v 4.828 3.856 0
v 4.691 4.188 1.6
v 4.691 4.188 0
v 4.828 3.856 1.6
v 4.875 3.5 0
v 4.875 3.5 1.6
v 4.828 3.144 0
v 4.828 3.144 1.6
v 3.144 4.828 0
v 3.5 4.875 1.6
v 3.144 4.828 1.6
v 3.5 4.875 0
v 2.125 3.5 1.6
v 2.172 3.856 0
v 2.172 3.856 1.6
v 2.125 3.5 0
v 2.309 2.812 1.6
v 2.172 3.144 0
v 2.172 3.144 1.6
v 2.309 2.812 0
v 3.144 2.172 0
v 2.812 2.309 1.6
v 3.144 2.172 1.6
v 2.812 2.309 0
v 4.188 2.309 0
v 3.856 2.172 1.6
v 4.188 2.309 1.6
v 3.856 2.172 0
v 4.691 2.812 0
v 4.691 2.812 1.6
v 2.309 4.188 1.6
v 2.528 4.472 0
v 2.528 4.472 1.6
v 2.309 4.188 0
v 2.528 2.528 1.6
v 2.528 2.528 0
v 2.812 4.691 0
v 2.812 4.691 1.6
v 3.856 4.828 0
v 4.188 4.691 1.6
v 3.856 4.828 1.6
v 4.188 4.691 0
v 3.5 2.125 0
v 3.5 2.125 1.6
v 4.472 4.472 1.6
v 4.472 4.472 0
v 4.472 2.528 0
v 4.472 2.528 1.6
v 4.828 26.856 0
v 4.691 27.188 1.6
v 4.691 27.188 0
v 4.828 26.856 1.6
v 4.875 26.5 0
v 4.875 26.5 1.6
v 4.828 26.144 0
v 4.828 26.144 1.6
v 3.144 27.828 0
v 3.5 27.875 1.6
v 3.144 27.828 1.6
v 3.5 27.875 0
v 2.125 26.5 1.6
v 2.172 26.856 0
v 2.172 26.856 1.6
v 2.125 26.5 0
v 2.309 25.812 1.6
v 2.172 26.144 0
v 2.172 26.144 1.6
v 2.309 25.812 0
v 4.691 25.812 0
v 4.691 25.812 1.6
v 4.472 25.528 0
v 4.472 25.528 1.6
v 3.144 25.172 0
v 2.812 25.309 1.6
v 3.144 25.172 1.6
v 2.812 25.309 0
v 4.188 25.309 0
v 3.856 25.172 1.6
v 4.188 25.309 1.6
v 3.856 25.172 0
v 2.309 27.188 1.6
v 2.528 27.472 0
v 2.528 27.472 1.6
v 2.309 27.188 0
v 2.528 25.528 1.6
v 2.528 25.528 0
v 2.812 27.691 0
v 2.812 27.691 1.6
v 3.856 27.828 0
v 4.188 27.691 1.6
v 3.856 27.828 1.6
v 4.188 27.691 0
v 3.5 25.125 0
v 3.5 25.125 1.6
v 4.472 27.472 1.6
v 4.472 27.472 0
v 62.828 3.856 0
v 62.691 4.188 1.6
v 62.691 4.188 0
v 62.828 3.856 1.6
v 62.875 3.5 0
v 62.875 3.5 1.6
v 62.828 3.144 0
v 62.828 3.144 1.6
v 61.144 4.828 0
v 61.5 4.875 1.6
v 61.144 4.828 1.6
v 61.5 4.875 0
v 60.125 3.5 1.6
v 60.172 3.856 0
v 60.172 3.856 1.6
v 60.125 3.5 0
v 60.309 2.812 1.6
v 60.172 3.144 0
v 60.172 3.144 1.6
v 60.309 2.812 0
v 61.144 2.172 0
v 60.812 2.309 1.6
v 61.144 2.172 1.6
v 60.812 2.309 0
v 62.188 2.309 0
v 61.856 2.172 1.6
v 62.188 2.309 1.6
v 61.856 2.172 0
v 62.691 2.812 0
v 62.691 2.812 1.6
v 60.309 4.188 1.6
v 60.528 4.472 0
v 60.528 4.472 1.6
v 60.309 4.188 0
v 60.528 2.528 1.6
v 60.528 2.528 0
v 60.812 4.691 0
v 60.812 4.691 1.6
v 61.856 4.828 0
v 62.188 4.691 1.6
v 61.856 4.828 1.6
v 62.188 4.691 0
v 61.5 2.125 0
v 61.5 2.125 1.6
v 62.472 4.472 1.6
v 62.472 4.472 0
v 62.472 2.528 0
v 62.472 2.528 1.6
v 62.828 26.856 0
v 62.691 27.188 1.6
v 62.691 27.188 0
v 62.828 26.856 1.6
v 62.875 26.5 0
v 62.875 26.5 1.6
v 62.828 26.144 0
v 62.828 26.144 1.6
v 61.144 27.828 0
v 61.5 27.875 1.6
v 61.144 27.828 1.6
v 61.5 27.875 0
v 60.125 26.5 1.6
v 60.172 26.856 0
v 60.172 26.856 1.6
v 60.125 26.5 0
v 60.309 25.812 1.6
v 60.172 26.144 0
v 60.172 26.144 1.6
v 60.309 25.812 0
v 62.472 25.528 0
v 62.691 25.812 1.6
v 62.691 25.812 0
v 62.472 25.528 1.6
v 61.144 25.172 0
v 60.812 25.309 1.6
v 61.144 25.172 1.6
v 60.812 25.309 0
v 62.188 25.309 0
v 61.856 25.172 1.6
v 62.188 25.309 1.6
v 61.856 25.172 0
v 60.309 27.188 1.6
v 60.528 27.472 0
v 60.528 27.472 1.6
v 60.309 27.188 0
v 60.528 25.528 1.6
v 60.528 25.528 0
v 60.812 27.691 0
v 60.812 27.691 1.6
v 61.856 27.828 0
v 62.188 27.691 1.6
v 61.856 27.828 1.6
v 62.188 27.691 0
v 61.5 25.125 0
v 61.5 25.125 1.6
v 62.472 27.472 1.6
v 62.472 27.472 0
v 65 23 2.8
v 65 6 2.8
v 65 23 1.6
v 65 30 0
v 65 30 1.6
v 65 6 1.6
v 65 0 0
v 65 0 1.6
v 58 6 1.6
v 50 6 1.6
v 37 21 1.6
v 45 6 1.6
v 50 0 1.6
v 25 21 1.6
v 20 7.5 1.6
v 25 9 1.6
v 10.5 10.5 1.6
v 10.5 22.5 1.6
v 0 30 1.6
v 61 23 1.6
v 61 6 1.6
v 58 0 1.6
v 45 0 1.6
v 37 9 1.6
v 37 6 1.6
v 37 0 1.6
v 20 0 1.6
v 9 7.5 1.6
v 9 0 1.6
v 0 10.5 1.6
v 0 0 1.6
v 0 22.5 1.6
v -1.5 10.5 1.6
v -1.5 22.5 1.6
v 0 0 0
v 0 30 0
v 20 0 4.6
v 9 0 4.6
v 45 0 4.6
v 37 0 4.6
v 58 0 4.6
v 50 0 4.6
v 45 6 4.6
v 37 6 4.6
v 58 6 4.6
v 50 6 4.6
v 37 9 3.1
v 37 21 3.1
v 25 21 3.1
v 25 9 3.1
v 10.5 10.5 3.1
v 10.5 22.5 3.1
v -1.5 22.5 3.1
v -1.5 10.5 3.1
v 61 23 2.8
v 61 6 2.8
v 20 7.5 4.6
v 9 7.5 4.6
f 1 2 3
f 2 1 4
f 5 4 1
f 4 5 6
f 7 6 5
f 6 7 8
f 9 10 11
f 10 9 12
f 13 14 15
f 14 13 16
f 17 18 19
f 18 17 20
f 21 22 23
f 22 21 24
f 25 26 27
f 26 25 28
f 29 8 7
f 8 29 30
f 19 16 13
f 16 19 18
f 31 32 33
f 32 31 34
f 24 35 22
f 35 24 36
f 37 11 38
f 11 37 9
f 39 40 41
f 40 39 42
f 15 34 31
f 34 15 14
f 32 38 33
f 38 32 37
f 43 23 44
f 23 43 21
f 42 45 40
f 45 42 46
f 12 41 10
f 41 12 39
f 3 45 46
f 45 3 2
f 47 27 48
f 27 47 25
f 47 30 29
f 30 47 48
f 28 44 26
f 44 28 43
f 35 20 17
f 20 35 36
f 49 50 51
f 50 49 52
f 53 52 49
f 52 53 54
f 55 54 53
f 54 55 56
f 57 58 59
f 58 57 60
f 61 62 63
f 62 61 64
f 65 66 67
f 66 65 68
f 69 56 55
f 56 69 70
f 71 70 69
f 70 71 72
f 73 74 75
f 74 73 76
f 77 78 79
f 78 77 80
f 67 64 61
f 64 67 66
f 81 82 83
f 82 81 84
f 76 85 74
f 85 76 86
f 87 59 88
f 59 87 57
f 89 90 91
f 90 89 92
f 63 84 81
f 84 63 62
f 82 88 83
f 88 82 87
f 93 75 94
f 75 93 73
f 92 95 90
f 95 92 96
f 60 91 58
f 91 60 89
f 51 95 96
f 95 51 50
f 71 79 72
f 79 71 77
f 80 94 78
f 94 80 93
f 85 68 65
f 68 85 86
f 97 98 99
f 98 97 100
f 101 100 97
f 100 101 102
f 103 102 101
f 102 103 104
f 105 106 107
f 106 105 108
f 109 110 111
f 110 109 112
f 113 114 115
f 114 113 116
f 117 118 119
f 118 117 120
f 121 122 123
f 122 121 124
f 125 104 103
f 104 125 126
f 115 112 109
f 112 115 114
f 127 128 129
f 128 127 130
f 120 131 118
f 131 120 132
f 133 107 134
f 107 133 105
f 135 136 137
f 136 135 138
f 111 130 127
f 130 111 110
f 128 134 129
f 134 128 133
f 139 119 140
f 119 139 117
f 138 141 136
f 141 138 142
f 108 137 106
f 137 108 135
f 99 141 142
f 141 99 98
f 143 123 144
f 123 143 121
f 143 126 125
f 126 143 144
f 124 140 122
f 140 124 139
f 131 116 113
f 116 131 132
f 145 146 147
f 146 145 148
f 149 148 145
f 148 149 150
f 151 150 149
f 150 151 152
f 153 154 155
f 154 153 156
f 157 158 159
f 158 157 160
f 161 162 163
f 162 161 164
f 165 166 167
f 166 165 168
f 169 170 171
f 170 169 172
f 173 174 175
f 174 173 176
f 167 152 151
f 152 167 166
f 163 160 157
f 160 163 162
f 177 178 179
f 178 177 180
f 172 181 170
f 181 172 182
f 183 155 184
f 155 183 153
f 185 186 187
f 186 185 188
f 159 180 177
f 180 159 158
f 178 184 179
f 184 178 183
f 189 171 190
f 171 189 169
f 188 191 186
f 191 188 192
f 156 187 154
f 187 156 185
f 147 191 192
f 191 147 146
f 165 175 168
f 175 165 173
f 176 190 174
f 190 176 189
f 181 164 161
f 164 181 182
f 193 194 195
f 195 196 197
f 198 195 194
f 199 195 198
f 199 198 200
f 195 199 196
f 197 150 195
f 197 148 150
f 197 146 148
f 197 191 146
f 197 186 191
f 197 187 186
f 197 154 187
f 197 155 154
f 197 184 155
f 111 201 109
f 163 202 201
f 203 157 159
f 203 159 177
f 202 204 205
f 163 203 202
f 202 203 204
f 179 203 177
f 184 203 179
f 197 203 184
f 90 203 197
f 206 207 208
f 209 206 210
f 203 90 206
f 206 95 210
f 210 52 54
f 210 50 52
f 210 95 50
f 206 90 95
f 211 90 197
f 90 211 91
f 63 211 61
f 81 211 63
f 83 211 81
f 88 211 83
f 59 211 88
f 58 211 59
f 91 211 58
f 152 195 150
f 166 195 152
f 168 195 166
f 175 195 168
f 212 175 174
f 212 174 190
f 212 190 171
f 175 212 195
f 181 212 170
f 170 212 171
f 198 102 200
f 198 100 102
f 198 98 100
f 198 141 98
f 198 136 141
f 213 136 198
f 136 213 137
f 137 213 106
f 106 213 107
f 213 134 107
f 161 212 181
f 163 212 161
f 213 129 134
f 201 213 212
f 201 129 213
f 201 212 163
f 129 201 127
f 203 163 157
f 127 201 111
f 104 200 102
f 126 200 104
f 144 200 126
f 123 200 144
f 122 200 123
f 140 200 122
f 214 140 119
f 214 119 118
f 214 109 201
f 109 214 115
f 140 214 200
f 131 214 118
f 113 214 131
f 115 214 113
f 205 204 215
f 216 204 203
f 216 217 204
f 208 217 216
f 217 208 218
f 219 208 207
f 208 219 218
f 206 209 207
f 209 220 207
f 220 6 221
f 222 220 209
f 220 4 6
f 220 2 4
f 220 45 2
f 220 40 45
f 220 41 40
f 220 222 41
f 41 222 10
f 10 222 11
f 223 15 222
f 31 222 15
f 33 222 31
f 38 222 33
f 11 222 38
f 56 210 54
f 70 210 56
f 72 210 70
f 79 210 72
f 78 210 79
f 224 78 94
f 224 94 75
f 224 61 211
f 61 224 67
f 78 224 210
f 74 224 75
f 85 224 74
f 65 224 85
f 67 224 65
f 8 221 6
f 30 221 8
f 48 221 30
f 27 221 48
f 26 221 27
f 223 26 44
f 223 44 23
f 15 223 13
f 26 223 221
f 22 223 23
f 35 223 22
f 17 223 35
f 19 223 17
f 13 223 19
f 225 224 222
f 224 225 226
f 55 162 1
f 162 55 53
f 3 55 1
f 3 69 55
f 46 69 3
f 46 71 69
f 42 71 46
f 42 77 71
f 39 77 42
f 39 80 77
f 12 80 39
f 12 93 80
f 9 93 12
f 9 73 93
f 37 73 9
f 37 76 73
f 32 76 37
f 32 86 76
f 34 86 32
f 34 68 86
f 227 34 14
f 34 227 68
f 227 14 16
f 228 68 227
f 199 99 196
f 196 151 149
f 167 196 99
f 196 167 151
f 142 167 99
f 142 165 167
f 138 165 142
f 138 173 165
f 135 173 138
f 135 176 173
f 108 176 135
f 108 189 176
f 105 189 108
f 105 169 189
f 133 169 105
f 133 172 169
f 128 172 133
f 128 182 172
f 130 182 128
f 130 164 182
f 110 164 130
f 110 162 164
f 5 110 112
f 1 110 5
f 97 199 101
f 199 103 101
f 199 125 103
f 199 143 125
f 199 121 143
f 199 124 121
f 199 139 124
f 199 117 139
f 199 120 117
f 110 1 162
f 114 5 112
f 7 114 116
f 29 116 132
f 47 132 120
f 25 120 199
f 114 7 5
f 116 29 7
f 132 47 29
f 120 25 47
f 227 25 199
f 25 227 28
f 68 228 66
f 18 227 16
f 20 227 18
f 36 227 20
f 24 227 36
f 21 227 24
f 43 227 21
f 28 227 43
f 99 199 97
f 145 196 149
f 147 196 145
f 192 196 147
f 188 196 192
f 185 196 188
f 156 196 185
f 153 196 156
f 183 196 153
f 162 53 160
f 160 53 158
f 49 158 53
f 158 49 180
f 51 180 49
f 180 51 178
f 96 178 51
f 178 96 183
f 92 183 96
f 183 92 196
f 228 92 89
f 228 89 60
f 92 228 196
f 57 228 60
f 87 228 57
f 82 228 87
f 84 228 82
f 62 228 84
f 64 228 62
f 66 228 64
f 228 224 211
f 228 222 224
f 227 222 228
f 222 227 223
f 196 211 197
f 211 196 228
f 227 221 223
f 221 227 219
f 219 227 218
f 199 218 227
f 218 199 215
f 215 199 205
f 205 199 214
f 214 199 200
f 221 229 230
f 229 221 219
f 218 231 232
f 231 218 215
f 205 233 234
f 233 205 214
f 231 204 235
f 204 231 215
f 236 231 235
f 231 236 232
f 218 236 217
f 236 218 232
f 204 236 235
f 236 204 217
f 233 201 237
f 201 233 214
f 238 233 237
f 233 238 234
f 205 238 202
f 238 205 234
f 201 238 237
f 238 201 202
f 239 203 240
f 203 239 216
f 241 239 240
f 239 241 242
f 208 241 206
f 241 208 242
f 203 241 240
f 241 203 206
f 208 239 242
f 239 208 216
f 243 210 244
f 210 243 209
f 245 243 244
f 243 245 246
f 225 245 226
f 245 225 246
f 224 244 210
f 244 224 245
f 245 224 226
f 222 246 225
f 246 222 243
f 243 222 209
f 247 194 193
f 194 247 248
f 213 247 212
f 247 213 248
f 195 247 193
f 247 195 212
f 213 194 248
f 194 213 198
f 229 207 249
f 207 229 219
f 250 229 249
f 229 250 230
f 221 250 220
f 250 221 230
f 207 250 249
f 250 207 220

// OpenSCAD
// =====================================================================
// pizero_2w.scad — Raspberry Pi Zero 2 W 簡易モデル (購入品)
// 配置検討・アセンブリ用プレースホルダ。印刷対象ではない。
// 原点: 基板左下 (0,0,0)。X=65 / Y=30 / Z=上。穴 4-Ø2.75 (58×23, inset3.5)。
// =====================================================================

pcb_w = 65;
pcb_d = 30;
pcb_t = 1.6;

difference() {
    cube([pcb_w, pcb_d, pcb_t]);
    for (x = [3.5, 61.5]) for (y = [3.5, 26.5])
        translate([x, y, -0.5]) cylinder(d=2.75, h=pcb_t + 1, $fn=24);
}
// SoC + メモリ (概略)
translate([25, 9, pcb_t]) cube([12, 12, 1.5]);
// microSD (端から張出し)
translate([-1.5, 10.5, pcb_t]) cube([12, 12, 1.5]);
// CSI コネクタ (端)
translate([61, 6, pcb_t]) cube([4, 17, 1.2]);
// microUSB ×2 + miniHDMI (縁)
for (x = [37, 50]) translate([x, 0, pcb_t]) cube([8, 6, 3]);
translate([9, 0, pcb_t]) cube([11, 7.5, 3]);
